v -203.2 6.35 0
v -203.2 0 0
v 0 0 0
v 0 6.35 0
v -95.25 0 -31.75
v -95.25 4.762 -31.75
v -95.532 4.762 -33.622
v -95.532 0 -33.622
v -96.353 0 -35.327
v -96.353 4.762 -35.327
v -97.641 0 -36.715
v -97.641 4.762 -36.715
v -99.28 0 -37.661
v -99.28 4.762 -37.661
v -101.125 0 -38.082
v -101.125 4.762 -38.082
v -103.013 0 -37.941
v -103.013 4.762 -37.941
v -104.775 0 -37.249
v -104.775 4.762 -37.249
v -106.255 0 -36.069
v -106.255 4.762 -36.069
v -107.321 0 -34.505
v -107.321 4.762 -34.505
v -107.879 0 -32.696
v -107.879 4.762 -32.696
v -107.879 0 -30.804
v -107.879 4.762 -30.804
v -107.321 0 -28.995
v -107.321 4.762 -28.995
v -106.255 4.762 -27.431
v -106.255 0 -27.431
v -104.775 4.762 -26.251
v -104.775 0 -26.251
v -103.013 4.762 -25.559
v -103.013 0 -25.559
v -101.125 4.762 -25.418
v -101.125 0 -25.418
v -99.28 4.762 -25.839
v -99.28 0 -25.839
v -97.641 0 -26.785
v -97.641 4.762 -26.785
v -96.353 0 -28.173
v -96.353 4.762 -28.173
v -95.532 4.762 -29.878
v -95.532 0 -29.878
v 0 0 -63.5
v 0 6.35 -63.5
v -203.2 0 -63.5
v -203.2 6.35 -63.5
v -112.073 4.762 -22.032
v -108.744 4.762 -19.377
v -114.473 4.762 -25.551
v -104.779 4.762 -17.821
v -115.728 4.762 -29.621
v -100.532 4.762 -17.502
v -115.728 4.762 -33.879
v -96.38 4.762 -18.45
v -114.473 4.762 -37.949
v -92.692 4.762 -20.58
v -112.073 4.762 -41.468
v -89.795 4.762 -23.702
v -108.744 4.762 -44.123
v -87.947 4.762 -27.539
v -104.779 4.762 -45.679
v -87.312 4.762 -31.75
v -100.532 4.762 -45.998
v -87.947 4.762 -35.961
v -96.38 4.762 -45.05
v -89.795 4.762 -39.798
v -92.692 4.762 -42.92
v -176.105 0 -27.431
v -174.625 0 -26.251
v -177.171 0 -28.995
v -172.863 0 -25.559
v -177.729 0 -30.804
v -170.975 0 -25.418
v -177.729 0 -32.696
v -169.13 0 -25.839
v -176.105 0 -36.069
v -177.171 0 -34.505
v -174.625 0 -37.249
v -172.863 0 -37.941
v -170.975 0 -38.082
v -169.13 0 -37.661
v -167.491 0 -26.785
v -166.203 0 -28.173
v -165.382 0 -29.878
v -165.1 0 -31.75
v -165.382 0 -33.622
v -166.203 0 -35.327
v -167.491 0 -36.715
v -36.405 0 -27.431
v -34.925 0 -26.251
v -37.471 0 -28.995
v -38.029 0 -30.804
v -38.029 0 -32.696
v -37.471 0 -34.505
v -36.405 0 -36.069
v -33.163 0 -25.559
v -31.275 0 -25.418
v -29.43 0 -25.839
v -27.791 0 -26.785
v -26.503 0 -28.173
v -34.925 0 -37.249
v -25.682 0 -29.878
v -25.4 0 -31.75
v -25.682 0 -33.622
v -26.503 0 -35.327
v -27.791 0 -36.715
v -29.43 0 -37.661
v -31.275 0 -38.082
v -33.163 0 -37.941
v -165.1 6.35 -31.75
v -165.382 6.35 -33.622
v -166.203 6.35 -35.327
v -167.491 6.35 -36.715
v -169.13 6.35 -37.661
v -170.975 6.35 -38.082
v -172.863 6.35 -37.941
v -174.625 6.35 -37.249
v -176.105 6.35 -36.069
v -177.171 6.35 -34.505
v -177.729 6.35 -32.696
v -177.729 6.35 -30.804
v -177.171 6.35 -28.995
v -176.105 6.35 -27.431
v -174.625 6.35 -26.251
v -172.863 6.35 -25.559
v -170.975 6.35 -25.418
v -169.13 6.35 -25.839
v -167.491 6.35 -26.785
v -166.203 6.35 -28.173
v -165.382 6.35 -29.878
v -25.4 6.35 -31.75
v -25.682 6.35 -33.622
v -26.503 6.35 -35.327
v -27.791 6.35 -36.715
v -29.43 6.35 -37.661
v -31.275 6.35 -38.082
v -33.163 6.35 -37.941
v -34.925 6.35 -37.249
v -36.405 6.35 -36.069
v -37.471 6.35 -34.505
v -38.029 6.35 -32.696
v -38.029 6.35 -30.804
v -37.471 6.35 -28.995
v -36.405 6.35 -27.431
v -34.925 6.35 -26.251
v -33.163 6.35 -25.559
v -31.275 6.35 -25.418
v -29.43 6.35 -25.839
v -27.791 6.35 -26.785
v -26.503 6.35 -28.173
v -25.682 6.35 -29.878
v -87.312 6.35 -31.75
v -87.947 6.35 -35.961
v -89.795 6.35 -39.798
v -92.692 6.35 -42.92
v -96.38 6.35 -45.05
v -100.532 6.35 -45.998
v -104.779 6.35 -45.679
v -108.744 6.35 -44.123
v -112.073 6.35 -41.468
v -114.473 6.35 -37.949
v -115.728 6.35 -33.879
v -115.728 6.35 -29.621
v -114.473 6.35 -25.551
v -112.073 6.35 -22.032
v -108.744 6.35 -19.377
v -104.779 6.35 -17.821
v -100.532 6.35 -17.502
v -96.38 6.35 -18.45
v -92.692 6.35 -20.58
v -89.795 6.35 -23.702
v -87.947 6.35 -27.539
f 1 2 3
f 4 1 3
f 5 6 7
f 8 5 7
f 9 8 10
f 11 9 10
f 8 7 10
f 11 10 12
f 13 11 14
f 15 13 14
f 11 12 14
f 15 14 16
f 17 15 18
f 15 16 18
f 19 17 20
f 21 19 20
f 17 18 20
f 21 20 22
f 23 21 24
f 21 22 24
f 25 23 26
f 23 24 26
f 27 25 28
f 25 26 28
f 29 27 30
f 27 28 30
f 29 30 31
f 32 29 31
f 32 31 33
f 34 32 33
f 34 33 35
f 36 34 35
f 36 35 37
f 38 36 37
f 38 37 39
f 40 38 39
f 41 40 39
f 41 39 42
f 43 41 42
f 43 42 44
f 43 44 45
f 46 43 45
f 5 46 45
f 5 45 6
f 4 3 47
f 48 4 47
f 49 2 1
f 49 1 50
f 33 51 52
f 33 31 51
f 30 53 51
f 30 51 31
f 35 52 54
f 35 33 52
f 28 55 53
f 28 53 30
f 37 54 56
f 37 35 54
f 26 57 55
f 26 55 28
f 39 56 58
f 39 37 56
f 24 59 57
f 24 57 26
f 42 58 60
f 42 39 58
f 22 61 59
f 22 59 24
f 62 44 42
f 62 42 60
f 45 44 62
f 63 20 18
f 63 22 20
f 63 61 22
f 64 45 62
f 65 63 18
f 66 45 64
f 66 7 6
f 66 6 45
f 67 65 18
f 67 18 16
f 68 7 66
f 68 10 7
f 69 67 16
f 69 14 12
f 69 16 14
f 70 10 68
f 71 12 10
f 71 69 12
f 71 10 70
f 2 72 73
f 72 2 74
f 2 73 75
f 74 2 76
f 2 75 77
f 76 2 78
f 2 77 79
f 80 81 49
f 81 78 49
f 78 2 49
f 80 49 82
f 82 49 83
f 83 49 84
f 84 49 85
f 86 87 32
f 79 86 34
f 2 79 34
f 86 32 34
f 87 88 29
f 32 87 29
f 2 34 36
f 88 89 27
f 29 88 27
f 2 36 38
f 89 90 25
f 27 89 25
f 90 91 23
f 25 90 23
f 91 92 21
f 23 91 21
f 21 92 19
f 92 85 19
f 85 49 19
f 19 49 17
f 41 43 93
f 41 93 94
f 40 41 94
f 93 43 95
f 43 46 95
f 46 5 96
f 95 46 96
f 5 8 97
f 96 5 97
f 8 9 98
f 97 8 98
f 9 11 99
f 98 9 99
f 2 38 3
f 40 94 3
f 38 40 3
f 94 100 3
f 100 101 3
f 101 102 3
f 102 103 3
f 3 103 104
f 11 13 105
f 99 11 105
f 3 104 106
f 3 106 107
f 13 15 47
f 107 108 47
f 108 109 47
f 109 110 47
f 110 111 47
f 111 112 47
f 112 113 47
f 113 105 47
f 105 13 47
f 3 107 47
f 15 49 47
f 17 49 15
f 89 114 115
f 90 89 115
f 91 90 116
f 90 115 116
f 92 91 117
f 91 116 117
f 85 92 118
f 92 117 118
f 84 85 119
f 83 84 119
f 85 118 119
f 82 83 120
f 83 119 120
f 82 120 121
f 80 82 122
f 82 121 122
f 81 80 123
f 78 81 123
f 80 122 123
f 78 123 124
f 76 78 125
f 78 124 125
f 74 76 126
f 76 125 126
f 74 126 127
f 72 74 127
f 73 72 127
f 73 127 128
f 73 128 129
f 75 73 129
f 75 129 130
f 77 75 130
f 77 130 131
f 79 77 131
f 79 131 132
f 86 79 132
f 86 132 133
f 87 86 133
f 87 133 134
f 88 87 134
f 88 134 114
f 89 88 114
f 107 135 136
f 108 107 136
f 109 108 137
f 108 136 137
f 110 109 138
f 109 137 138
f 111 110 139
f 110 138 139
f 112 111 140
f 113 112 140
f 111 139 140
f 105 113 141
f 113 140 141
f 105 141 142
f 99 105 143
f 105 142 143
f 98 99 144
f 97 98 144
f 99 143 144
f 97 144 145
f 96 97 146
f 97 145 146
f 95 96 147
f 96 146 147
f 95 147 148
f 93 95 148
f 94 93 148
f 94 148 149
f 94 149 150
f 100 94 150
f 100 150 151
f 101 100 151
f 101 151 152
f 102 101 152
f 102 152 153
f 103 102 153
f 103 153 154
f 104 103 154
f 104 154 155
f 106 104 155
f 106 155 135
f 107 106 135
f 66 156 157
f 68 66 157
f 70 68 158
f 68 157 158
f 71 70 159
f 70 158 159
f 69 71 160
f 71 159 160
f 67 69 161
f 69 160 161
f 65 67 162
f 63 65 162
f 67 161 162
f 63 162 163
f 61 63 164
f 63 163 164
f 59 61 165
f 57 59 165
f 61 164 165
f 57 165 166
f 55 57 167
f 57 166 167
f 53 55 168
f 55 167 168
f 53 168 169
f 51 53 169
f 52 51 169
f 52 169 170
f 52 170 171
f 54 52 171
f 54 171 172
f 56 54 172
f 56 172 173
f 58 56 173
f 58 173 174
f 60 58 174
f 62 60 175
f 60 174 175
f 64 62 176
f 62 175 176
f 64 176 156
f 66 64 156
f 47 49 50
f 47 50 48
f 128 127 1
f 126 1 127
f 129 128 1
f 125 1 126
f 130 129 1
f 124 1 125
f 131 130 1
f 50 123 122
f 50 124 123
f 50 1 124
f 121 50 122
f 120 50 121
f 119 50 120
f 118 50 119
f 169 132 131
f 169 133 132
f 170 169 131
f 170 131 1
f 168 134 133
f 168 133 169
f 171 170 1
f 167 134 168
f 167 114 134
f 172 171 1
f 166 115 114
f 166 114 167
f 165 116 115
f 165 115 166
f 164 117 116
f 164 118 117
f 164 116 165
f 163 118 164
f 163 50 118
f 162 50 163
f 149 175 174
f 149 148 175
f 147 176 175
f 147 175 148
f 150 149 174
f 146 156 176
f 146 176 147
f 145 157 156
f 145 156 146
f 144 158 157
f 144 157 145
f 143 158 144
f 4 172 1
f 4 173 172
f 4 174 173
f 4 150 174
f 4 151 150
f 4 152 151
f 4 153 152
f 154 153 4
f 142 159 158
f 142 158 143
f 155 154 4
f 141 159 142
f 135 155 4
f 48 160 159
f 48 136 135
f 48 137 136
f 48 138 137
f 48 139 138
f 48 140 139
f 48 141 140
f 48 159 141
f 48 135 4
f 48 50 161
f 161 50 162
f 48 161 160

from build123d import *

# Parameters (mm, degrees)
SKETCH8_W           = 203.2
SKETCH8_H           = 63.5
BOSS_EXTRUDE1_DEPTH = 6.35
SKETCH9_R           = 14.2875
CUT_EXTRUDE2_DEPTH  = 1.5875
SKETCH10_R          = 6.35
CUT_EXTRUDE3_DEPTH  = 5.7625
SKETCH11_R          = 6.35
CUT_EXTRUDE4_DEPTH  = 7.35


with BuildPart() as part:
    # Sketch8 → Boss-Extrude1 (new body)
    with BuildSketch(Plane(origin=(0, 0, 0), x_dir=(1, 0, 0), z_dir=(0, 1, 0))):
        with Locations((-101.6, 31.75)):
            Rectangle(SKETCH8_W, SKETCH8_H)
    extrude(amount=BOSS_EXTRUDE1_DEPTH)

    # Sketch9 → Cut-Extrude2 (cut)
    with BuildSketch(Plane(origin=(0, 6.35, 0), x_dir=(1, 0, 0), z_dir=(0, 1, 0))):
        with Locations((-101.6, 31.75)):
            Circle(SKETCH9_R)
    extrude(amount=-CUT_EXTRUDE2_DEPTH, mode=Mode.SUBTRACT)

    # Sketch10 → Cut-Extrude3 (cut, through all)
    with BuildSketch(Plane(origin=(0, 4.7625, 0), x_dir=(1, 0, 0), z_dir=(0, 1, 0))):
        with Locations((-101.6, 31.75)):
            Circle(SKETCH10_R)
    extrude(amount=-CUT_EXTRUDE3_DEPTH, mode=Mode.SUBTRACT)

    # Sketch11 → Cut-Extrude4 (cut, through all)
    with BuildSketch(Plane(origin=(0, 6.35, 0), x_dir=(1, 0, 0), z_dir=(0, 1, 0))):
        with Locations((-171.45, 31.75)):
            Circle(SKETCH11_R)
        with Locations((-31.75, 31.75)):
            Circle(SKETCH11_R)
    extrude(amount=-CUT_EXTRUDE4_DEPTH, mode=Mode.SUBTRACT)


solid = part.part
